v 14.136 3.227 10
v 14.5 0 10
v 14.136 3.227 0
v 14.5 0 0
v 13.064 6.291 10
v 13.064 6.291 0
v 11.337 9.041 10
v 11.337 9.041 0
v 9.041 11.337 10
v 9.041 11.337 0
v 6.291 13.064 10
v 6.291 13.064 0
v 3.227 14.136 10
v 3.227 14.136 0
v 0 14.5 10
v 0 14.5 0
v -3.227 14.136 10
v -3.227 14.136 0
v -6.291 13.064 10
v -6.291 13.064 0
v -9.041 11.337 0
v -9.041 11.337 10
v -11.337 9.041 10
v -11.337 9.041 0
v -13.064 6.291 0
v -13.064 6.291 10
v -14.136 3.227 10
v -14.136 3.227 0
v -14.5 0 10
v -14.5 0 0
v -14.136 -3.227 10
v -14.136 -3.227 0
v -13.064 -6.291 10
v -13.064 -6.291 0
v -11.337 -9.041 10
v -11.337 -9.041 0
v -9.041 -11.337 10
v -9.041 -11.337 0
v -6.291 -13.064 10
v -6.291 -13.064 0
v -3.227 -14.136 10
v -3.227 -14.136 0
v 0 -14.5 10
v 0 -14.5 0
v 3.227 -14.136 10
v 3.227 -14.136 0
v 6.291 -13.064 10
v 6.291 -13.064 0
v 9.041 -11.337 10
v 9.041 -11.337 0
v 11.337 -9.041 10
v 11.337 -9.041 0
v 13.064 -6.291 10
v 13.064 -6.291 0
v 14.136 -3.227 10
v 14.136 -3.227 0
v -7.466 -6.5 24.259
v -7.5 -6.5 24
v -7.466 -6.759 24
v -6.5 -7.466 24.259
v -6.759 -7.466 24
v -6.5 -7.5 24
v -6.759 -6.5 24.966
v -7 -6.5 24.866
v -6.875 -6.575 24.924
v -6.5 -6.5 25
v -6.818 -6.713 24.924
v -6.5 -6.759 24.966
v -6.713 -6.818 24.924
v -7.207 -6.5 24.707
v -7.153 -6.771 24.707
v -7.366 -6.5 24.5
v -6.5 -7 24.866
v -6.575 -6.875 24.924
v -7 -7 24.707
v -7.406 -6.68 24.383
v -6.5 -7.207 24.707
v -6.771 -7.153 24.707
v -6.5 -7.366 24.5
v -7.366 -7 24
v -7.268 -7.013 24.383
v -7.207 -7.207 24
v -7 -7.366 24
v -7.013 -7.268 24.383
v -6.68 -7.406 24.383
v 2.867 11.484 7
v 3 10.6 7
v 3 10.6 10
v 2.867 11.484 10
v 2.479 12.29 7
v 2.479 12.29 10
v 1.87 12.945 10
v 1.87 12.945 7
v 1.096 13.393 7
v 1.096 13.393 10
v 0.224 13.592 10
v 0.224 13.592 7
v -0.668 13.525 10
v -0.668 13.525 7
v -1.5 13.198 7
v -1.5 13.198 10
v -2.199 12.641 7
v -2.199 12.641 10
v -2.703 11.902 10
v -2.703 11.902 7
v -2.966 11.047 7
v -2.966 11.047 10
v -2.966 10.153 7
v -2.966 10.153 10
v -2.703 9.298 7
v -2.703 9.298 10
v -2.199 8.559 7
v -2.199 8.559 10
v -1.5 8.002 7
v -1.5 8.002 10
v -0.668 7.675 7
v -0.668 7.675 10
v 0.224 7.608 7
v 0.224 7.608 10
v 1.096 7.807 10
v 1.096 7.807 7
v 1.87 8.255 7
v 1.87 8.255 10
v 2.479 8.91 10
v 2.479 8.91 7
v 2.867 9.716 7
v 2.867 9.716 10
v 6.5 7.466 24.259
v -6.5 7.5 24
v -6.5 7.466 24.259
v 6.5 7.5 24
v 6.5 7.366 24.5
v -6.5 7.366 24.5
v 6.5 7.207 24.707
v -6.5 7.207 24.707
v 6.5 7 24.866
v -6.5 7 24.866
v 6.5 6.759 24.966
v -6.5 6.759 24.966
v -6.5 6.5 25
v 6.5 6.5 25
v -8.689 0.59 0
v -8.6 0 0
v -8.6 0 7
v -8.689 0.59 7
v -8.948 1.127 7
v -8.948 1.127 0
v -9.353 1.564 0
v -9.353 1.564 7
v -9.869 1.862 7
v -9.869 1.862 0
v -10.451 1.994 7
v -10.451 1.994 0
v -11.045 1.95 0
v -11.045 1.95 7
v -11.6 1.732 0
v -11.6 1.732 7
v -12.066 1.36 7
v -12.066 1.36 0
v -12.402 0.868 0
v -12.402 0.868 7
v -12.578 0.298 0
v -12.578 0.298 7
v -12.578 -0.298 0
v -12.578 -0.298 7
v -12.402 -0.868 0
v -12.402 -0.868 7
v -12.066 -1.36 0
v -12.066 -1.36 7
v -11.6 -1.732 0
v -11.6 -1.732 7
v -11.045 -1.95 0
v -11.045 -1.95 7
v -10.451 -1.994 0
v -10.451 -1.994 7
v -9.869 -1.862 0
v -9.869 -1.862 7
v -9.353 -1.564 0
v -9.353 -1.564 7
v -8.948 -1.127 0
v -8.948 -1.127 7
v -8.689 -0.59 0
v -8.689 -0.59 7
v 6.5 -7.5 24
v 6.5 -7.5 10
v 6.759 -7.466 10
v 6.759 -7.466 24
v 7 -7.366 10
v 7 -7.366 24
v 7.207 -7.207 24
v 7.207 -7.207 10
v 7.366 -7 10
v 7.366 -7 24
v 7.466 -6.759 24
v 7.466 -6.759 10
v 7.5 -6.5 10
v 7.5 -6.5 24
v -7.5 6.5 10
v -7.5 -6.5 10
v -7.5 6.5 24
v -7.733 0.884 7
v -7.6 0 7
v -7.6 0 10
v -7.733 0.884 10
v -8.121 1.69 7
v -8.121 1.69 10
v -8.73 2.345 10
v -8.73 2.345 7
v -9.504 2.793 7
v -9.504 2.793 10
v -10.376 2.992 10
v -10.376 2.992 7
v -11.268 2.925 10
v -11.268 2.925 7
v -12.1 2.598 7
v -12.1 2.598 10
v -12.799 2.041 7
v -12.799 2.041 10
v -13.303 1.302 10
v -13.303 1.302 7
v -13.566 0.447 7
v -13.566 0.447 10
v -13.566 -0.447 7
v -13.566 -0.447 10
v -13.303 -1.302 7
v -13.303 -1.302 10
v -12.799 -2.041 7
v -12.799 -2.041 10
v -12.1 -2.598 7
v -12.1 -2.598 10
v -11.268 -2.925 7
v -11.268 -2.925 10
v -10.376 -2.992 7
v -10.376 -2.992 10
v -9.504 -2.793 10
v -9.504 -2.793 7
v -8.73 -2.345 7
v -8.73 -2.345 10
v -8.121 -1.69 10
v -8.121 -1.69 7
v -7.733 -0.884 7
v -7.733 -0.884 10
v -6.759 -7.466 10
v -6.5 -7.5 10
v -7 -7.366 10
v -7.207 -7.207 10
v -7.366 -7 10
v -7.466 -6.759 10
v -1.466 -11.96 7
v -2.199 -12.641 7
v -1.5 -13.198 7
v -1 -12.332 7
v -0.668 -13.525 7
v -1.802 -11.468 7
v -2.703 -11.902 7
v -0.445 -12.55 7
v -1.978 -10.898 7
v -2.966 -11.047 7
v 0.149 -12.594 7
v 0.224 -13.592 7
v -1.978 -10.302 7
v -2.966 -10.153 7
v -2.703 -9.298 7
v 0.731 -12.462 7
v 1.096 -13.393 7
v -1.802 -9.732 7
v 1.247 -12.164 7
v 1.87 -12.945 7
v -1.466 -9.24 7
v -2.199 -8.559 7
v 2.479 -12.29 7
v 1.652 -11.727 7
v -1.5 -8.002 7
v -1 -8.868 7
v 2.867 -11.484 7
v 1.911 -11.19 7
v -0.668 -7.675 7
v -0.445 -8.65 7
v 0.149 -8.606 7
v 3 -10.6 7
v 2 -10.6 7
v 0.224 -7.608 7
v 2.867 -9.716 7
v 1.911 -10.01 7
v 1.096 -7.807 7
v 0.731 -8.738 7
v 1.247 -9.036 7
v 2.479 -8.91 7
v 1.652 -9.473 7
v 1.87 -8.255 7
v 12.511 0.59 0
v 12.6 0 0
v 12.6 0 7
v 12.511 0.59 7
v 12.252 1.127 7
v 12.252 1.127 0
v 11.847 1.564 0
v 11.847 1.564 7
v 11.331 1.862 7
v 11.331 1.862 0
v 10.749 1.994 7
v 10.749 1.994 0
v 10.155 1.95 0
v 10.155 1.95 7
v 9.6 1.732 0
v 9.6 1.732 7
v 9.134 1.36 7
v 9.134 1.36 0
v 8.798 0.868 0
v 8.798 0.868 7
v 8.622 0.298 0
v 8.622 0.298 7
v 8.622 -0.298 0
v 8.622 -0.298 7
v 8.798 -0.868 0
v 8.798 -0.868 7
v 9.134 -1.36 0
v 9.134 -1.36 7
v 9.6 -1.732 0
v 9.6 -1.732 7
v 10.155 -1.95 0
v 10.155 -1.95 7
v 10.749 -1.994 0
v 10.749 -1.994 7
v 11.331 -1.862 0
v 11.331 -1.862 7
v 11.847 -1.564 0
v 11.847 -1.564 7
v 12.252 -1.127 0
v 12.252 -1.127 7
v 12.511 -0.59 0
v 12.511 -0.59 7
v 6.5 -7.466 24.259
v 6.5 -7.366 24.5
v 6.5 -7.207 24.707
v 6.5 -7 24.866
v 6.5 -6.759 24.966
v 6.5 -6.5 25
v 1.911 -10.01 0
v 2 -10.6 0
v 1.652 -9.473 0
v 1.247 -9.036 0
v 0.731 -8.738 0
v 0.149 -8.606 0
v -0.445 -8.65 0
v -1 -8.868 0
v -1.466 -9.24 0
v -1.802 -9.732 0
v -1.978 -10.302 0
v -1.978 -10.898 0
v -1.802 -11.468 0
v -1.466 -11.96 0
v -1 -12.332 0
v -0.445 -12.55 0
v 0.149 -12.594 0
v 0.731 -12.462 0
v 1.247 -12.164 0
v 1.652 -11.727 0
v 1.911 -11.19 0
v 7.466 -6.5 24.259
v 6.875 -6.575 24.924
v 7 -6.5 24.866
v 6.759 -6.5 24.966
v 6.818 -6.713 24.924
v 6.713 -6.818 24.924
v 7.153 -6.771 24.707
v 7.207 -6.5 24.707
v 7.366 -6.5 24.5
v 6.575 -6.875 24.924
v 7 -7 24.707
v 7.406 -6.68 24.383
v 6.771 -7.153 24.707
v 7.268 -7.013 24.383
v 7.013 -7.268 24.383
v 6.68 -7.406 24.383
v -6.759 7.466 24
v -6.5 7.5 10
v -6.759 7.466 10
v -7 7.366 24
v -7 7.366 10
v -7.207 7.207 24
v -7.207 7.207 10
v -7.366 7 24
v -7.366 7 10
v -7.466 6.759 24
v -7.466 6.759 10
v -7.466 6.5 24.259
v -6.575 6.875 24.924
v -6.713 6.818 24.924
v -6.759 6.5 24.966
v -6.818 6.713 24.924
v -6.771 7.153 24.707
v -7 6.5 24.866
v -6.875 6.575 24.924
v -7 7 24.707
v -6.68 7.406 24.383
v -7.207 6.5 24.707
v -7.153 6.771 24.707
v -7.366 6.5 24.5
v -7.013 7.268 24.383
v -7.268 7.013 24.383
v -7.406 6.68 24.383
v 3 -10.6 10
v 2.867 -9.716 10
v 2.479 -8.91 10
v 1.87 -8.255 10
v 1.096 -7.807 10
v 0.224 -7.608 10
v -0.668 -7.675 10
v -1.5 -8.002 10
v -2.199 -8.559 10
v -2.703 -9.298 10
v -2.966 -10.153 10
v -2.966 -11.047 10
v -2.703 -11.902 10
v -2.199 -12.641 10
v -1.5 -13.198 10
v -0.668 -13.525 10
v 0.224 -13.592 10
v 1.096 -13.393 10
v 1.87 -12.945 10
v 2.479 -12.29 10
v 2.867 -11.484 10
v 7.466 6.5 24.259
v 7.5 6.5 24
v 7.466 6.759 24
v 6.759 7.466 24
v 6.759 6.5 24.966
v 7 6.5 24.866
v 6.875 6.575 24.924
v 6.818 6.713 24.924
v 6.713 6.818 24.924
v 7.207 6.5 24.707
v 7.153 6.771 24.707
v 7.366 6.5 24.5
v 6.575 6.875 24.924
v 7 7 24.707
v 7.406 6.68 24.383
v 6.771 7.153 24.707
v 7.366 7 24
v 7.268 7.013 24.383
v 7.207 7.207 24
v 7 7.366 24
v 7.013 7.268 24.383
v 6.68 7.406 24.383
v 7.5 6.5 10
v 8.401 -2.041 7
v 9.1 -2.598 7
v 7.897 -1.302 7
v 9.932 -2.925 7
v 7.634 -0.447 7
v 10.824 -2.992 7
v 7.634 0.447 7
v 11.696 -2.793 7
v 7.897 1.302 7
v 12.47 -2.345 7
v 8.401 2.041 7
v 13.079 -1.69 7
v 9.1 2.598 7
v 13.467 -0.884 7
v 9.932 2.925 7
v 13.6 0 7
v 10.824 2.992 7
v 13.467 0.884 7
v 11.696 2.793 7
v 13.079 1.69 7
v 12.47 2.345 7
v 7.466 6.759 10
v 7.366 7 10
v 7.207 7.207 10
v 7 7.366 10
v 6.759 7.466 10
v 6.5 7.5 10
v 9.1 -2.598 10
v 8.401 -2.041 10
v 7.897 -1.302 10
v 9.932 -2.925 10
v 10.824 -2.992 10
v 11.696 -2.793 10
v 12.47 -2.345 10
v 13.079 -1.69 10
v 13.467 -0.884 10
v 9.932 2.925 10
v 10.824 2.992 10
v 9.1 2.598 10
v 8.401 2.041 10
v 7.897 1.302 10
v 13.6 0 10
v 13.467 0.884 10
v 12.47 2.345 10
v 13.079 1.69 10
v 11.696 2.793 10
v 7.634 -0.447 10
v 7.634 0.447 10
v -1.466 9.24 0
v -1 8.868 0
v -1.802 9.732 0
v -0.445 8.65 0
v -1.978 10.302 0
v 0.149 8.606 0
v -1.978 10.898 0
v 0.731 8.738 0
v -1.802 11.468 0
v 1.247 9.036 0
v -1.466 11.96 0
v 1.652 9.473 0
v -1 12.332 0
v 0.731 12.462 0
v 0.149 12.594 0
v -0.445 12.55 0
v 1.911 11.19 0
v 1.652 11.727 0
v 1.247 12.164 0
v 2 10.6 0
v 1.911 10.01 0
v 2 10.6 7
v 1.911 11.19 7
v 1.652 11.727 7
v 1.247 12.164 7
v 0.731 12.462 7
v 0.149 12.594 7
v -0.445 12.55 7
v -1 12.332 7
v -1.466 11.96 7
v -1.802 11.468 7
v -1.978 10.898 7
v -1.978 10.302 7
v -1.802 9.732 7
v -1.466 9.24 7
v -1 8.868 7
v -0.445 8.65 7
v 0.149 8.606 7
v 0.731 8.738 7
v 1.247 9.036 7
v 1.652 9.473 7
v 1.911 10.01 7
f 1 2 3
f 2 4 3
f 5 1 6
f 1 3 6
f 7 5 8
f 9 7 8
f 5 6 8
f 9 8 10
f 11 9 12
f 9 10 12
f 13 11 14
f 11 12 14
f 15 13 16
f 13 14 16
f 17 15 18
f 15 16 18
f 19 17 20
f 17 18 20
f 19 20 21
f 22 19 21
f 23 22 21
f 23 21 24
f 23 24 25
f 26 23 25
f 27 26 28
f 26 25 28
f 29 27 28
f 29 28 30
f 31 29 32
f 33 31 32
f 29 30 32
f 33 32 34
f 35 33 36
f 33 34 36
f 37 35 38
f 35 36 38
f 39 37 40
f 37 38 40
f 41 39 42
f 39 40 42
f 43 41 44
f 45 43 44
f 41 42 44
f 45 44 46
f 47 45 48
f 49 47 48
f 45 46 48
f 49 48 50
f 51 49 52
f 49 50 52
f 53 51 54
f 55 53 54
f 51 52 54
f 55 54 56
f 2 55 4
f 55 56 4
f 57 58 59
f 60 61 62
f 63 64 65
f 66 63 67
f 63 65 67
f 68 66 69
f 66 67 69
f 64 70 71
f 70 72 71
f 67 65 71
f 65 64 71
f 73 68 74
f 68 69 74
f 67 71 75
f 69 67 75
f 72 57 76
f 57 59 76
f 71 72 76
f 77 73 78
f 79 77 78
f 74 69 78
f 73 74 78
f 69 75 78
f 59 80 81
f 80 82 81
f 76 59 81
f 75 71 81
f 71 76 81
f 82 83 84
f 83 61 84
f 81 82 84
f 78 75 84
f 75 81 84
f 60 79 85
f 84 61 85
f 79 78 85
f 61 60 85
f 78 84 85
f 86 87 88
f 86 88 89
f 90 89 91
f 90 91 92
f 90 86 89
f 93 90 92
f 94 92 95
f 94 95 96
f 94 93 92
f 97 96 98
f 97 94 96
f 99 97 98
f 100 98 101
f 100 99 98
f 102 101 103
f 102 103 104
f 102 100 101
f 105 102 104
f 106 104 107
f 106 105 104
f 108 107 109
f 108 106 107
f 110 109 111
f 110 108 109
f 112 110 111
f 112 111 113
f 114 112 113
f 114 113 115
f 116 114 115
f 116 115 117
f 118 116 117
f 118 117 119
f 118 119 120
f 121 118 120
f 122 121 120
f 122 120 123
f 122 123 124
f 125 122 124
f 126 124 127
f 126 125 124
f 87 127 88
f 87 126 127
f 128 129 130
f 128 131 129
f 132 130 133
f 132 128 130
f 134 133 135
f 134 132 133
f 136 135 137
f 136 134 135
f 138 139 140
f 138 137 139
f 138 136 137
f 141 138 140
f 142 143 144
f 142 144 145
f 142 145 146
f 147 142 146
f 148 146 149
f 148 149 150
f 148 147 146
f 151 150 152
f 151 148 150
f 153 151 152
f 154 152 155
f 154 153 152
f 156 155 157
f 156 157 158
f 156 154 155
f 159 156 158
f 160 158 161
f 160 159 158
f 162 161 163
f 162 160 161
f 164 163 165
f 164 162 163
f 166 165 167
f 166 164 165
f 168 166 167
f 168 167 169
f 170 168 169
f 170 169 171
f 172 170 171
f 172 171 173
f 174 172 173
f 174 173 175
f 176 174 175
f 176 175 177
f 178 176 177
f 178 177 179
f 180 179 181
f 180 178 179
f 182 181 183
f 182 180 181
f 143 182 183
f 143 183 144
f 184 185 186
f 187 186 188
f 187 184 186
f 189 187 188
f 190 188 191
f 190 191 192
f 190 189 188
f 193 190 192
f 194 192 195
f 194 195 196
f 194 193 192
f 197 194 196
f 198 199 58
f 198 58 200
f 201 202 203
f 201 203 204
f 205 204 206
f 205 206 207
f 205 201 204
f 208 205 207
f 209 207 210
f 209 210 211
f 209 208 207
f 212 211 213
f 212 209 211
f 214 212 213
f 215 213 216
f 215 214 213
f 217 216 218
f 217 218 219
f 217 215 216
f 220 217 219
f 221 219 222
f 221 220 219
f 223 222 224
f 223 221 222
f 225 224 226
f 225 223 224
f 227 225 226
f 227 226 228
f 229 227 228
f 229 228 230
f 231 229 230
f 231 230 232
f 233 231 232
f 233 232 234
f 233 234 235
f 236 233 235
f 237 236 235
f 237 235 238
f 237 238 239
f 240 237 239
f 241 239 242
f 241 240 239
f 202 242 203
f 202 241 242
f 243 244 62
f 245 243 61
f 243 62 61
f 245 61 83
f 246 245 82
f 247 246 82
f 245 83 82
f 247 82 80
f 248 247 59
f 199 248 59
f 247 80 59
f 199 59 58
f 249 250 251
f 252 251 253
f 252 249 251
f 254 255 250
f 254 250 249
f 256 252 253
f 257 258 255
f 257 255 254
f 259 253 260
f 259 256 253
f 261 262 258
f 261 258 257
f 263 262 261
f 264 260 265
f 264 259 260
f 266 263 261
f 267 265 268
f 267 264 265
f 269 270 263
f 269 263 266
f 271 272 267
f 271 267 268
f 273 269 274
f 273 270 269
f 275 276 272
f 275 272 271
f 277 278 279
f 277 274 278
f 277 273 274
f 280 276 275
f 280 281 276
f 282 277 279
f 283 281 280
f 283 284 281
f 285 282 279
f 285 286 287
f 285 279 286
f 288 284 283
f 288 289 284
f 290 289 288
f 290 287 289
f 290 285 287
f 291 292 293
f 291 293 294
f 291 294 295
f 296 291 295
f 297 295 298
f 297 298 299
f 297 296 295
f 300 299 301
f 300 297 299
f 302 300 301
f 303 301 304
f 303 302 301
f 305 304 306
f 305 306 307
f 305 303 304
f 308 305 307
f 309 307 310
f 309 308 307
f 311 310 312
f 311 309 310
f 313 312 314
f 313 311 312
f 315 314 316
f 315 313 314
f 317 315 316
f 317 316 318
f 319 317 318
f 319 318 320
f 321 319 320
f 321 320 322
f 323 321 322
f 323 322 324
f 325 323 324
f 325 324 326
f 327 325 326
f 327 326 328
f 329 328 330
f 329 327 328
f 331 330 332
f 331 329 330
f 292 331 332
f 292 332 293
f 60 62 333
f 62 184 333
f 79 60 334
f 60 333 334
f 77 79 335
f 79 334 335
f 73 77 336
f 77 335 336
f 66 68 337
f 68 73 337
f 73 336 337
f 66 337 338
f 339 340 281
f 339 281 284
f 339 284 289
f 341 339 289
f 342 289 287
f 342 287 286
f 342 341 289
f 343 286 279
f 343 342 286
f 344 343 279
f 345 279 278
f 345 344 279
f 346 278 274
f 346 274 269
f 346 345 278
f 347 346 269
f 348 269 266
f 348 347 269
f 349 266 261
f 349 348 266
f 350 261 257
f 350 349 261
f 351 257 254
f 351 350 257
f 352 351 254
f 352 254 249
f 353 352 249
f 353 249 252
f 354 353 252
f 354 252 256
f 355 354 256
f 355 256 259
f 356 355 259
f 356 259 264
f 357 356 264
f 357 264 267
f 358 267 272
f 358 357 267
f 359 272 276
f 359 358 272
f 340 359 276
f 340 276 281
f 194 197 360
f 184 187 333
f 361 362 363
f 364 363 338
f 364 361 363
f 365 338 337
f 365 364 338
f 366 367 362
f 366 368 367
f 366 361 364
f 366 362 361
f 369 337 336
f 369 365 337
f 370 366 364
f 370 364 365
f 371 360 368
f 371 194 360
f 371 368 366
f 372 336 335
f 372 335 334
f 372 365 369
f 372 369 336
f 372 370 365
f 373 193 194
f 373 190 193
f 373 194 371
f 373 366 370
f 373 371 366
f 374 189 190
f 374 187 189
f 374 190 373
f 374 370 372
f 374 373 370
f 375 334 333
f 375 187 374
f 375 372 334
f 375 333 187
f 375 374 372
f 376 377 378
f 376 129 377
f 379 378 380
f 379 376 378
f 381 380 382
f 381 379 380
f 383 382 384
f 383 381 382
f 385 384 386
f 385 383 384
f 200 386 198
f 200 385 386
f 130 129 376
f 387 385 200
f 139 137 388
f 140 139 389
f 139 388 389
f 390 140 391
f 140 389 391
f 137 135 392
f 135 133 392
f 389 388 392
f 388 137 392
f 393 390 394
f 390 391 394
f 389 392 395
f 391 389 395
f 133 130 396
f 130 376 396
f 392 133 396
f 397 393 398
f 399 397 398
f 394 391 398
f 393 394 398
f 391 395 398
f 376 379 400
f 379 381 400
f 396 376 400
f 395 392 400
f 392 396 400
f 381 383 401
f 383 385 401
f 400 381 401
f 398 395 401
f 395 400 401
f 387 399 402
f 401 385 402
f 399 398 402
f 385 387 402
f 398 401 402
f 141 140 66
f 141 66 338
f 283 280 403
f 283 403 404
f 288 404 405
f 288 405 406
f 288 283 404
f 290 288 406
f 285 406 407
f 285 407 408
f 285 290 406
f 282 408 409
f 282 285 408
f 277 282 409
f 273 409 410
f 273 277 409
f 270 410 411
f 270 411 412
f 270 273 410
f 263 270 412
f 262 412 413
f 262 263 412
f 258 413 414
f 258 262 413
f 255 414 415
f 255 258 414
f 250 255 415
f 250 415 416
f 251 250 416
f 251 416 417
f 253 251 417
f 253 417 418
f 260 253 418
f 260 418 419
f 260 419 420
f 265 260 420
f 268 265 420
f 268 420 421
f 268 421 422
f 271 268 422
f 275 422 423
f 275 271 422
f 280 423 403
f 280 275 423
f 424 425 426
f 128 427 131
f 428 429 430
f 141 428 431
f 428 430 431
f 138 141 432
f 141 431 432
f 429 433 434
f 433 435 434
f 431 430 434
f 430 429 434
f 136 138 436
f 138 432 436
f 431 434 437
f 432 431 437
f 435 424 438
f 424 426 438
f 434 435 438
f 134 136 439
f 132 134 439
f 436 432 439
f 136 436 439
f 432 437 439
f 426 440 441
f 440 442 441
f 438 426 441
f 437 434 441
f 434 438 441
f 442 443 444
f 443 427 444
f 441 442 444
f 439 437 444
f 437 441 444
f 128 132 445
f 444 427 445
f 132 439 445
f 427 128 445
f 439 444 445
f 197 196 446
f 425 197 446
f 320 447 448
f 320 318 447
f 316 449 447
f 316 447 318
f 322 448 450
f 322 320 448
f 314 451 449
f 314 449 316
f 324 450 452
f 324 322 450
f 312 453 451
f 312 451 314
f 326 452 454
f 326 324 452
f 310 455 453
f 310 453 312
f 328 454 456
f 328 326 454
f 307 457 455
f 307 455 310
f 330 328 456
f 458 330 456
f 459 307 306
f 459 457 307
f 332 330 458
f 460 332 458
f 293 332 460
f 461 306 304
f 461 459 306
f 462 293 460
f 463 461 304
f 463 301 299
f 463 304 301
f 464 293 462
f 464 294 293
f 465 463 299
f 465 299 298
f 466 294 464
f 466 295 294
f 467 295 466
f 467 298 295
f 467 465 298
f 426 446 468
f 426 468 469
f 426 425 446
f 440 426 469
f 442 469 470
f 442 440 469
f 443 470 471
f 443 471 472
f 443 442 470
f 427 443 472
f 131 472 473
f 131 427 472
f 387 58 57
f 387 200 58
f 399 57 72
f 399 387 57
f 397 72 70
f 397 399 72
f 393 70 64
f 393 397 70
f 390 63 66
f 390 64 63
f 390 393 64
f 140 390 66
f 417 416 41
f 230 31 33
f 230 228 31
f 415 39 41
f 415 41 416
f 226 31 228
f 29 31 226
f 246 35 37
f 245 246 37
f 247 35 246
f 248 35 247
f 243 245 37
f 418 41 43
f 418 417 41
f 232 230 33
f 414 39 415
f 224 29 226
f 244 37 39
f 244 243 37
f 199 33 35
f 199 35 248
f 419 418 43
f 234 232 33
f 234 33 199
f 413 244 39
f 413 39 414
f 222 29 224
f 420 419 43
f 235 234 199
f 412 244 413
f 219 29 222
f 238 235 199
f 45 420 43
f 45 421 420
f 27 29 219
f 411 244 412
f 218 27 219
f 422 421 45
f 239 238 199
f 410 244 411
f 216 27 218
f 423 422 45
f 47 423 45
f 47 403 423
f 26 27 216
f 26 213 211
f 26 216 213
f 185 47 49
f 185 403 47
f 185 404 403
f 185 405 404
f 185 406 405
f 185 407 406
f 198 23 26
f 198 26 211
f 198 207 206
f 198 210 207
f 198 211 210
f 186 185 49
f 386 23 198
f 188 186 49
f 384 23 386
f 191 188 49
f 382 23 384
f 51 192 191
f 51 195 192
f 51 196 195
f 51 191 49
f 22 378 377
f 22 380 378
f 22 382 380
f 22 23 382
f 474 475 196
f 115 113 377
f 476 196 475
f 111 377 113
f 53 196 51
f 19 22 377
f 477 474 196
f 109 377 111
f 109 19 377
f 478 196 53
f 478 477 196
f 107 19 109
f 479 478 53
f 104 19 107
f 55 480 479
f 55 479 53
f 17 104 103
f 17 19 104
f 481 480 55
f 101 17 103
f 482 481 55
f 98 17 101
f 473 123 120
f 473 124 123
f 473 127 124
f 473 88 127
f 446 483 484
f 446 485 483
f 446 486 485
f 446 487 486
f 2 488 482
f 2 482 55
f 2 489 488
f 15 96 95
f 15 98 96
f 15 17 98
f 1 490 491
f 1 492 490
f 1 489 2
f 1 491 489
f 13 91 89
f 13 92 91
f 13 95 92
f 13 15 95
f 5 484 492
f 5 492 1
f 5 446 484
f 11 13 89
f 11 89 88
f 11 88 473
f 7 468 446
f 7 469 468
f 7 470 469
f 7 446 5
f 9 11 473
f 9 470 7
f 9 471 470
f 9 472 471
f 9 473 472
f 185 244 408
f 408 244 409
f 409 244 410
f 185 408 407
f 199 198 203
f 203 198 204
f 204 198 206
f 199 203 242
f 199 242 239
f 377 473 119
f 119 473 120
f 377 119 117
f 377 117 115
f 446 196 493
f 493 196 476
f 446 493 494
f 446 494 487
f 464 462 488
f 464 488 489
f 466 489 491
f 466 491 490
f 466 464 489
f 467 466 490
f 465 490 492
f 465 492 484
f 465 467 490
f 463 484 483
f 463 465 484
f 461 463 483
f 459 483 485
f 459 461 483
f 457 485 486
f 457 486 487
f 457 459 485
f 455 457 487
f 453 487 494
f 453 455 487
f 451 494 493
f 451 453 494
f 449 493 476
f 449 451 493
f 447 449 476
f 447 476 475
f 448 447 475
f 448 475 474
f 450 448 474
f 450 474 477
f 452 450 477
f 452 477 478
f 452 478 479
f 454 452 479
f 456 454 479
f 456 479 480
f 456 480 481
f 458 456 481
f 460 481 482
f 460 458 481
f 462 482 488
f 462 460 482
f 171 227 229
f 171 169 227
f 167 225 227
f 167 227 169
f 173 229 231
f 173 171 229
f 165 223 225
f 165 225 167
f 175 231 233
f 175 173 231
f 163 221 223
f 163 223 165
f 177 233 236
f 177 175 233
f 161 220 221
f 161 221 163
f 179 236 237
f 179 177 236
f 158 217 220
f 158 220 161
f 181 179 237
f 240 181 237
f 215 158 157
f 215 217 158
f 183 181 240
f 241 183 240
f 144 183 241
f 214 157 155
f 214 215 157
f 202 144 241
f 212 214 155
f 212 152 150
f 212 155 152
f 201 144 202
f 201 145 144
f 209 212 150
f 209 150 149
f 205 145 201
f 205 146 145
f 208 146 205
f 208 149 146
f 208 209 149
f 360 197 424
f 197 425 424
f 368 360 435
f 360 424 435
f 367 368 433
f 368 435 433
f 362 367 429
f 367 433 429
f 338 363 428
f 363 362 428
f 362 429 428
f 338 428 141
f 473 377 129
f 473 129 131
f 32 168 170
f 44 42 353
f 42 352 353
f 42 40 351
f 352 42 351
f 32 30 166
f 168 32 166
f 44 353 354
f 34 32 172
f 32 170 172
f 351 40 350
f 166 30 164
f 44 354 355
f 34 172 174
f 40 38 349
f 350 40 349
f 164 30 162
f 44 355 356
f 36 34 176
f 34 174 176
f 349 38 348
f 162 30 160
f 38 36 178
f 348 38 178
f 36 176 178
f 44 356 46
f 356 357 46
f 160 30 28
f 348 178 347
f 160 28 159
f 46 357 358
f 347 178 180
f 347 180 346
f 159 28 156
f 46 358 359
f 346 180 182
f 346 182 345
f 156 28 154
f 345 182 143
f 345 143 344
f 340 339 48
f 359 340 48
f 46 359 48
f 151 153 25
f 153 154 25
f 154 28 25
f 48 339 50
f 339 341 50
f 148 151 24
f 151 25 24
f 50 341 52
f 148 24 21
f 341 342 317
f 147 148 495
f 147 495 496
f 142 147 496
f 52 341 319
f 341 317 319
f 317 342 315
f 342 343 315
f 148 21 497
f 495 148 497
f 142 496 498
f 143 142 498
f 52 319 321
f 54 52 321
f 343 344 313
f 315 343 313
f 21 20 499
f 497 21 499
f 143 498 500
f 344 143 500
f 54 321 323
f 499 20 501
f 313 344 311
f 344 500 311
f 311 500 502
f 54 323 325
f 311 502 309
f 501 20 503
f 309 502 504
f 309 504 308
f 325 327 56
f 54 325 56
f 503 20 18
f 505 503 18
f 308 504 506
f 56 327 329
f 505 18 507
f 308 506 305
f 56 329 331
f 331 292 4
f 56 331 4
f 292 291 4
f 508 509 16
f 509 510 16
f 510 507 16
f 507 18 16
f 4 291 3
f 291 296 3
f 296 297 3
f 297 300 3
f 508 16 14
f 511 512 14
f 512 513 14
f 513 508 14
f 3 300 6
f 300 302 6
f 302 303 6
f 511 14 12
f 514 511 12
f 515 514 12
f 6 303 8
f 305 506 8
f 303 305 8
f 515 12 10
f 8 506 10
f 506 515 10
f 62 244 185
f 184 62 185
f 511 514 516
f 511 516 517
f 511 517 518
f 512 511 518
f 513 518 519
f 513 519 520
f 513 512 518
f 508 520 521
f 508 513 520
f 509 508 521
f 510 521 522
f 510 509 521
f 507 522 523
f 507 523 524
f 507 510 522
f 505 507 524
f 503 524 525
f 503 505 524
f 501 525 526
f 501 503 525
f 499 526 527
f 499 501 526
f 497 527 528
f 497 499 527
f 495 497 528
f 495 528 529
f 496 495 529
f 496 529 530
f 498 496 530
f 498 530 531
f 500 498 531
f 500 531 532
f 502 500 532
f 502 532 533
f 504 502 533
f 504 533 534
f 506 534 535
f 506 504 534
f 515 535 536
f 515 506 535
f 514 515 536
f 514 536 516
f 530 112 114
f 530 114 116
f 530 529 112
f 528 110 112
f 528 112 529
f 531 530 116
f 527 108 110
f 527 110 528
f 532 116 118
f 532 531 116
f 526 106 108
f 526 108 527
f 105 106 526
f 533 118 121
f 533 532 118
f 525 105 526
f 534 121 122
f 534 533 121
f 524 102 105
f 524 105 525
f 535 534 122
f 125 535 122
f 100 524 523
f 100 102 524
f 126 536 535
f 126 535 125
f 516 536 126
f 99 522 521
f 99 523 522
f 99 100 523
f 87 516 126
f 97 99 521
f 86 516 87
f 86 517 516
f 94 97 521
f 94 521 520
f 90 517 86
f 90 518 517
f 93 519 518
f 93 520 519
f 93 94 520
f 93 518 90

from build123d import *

# Parameters (mm, degrees)
SKETCH1_R           = 14.5
SKETCH1_R_2         = 2
BOSS_EXTRUDE3_DEPTH = 7
SKETCH3_R           = 14.5
SKETCH3_R_2         = 3
BOSS_EXTRUDE4_DEPTH = 3
SKETCH4_W           = 15
SKETCH4_H           = 15
BOSS_EXTRUDE5_DEPTH = 15
FILLET1_R           = 1


with BuildPart() as part:
    # Sketch1 → Boss-Extrude3 (new body)
    with BuildSketch(Plane.XY):
        Circle(SKETCH1_R)
        with Locations((10.6, 0)):
            Circle(SKETCH1_R_2, mode=Mode.SUBTRACT)
        with Locations((0, 10.6)):
            Circle(SKETCH1_R_2, mode=Mode.SUBTRACT)
        with Locations((-10.6, 0)):
            Circle(SKETCH1_R_2, mode=Mode.SUBTRACT)
        with Locations((0, -10.6)):
            Circle(SKETCH1_R_2, mode=Mode.SUBTRACT)
    extrude(amount=BOSS_EXTRUDE3_DEPTH)

    # Sketch3 → Boss-Extrude4 (add)
    with BuildSketch(Plane.XY.offset(7)):
        Circle(SKETCH3_R)
        with Locations((10.6, 0)):
            Circle(SKETCH3_R_2, mode=Mode.SUBTRACT)
        with Locations((0, -10.6)):
            Circle(SKETCH3_R_2, mode=Mode.SUBTRACT)
        with Locations((-10.6, 0)):
            Circle(SKETCH3_R_2, mode=Mode.SUBTRACT)
        with Locations((0, 10.6)):
            Circle(SKETCH3_R_2, mode=Mode.SUBTRACT)
    extrude(amount=BOSS_EXTRUDE4_DEPTH)

    # Sketch4 → Boss-Extrude5 (add)
    with BuildSketch(Plane.XY.offset(10)):
        Rectangle(SKETCH4_W, SKETCH4_H)
    extrude(amount=BOSS_EXTRUDE5_DEPTH)

    # Fillet1
    fillet1_edges = [part.edges().sort_by_distance(p)[0] for p in [
        (7.5, -7.5, 17.5),
        (7.5, 7.5, 17.5),
        (-7.5, 7.5, 17.5),
        (-7.5, -7.5, 17.5),
        (7.5, 0, 25),
        (0, 7.5, 25),
        (-7.5, 0, 25),
        (0, -7.5, 25),
    ]]
    fillet(fillet1_edges, radius=FILLET1_R)


solid = part.part
